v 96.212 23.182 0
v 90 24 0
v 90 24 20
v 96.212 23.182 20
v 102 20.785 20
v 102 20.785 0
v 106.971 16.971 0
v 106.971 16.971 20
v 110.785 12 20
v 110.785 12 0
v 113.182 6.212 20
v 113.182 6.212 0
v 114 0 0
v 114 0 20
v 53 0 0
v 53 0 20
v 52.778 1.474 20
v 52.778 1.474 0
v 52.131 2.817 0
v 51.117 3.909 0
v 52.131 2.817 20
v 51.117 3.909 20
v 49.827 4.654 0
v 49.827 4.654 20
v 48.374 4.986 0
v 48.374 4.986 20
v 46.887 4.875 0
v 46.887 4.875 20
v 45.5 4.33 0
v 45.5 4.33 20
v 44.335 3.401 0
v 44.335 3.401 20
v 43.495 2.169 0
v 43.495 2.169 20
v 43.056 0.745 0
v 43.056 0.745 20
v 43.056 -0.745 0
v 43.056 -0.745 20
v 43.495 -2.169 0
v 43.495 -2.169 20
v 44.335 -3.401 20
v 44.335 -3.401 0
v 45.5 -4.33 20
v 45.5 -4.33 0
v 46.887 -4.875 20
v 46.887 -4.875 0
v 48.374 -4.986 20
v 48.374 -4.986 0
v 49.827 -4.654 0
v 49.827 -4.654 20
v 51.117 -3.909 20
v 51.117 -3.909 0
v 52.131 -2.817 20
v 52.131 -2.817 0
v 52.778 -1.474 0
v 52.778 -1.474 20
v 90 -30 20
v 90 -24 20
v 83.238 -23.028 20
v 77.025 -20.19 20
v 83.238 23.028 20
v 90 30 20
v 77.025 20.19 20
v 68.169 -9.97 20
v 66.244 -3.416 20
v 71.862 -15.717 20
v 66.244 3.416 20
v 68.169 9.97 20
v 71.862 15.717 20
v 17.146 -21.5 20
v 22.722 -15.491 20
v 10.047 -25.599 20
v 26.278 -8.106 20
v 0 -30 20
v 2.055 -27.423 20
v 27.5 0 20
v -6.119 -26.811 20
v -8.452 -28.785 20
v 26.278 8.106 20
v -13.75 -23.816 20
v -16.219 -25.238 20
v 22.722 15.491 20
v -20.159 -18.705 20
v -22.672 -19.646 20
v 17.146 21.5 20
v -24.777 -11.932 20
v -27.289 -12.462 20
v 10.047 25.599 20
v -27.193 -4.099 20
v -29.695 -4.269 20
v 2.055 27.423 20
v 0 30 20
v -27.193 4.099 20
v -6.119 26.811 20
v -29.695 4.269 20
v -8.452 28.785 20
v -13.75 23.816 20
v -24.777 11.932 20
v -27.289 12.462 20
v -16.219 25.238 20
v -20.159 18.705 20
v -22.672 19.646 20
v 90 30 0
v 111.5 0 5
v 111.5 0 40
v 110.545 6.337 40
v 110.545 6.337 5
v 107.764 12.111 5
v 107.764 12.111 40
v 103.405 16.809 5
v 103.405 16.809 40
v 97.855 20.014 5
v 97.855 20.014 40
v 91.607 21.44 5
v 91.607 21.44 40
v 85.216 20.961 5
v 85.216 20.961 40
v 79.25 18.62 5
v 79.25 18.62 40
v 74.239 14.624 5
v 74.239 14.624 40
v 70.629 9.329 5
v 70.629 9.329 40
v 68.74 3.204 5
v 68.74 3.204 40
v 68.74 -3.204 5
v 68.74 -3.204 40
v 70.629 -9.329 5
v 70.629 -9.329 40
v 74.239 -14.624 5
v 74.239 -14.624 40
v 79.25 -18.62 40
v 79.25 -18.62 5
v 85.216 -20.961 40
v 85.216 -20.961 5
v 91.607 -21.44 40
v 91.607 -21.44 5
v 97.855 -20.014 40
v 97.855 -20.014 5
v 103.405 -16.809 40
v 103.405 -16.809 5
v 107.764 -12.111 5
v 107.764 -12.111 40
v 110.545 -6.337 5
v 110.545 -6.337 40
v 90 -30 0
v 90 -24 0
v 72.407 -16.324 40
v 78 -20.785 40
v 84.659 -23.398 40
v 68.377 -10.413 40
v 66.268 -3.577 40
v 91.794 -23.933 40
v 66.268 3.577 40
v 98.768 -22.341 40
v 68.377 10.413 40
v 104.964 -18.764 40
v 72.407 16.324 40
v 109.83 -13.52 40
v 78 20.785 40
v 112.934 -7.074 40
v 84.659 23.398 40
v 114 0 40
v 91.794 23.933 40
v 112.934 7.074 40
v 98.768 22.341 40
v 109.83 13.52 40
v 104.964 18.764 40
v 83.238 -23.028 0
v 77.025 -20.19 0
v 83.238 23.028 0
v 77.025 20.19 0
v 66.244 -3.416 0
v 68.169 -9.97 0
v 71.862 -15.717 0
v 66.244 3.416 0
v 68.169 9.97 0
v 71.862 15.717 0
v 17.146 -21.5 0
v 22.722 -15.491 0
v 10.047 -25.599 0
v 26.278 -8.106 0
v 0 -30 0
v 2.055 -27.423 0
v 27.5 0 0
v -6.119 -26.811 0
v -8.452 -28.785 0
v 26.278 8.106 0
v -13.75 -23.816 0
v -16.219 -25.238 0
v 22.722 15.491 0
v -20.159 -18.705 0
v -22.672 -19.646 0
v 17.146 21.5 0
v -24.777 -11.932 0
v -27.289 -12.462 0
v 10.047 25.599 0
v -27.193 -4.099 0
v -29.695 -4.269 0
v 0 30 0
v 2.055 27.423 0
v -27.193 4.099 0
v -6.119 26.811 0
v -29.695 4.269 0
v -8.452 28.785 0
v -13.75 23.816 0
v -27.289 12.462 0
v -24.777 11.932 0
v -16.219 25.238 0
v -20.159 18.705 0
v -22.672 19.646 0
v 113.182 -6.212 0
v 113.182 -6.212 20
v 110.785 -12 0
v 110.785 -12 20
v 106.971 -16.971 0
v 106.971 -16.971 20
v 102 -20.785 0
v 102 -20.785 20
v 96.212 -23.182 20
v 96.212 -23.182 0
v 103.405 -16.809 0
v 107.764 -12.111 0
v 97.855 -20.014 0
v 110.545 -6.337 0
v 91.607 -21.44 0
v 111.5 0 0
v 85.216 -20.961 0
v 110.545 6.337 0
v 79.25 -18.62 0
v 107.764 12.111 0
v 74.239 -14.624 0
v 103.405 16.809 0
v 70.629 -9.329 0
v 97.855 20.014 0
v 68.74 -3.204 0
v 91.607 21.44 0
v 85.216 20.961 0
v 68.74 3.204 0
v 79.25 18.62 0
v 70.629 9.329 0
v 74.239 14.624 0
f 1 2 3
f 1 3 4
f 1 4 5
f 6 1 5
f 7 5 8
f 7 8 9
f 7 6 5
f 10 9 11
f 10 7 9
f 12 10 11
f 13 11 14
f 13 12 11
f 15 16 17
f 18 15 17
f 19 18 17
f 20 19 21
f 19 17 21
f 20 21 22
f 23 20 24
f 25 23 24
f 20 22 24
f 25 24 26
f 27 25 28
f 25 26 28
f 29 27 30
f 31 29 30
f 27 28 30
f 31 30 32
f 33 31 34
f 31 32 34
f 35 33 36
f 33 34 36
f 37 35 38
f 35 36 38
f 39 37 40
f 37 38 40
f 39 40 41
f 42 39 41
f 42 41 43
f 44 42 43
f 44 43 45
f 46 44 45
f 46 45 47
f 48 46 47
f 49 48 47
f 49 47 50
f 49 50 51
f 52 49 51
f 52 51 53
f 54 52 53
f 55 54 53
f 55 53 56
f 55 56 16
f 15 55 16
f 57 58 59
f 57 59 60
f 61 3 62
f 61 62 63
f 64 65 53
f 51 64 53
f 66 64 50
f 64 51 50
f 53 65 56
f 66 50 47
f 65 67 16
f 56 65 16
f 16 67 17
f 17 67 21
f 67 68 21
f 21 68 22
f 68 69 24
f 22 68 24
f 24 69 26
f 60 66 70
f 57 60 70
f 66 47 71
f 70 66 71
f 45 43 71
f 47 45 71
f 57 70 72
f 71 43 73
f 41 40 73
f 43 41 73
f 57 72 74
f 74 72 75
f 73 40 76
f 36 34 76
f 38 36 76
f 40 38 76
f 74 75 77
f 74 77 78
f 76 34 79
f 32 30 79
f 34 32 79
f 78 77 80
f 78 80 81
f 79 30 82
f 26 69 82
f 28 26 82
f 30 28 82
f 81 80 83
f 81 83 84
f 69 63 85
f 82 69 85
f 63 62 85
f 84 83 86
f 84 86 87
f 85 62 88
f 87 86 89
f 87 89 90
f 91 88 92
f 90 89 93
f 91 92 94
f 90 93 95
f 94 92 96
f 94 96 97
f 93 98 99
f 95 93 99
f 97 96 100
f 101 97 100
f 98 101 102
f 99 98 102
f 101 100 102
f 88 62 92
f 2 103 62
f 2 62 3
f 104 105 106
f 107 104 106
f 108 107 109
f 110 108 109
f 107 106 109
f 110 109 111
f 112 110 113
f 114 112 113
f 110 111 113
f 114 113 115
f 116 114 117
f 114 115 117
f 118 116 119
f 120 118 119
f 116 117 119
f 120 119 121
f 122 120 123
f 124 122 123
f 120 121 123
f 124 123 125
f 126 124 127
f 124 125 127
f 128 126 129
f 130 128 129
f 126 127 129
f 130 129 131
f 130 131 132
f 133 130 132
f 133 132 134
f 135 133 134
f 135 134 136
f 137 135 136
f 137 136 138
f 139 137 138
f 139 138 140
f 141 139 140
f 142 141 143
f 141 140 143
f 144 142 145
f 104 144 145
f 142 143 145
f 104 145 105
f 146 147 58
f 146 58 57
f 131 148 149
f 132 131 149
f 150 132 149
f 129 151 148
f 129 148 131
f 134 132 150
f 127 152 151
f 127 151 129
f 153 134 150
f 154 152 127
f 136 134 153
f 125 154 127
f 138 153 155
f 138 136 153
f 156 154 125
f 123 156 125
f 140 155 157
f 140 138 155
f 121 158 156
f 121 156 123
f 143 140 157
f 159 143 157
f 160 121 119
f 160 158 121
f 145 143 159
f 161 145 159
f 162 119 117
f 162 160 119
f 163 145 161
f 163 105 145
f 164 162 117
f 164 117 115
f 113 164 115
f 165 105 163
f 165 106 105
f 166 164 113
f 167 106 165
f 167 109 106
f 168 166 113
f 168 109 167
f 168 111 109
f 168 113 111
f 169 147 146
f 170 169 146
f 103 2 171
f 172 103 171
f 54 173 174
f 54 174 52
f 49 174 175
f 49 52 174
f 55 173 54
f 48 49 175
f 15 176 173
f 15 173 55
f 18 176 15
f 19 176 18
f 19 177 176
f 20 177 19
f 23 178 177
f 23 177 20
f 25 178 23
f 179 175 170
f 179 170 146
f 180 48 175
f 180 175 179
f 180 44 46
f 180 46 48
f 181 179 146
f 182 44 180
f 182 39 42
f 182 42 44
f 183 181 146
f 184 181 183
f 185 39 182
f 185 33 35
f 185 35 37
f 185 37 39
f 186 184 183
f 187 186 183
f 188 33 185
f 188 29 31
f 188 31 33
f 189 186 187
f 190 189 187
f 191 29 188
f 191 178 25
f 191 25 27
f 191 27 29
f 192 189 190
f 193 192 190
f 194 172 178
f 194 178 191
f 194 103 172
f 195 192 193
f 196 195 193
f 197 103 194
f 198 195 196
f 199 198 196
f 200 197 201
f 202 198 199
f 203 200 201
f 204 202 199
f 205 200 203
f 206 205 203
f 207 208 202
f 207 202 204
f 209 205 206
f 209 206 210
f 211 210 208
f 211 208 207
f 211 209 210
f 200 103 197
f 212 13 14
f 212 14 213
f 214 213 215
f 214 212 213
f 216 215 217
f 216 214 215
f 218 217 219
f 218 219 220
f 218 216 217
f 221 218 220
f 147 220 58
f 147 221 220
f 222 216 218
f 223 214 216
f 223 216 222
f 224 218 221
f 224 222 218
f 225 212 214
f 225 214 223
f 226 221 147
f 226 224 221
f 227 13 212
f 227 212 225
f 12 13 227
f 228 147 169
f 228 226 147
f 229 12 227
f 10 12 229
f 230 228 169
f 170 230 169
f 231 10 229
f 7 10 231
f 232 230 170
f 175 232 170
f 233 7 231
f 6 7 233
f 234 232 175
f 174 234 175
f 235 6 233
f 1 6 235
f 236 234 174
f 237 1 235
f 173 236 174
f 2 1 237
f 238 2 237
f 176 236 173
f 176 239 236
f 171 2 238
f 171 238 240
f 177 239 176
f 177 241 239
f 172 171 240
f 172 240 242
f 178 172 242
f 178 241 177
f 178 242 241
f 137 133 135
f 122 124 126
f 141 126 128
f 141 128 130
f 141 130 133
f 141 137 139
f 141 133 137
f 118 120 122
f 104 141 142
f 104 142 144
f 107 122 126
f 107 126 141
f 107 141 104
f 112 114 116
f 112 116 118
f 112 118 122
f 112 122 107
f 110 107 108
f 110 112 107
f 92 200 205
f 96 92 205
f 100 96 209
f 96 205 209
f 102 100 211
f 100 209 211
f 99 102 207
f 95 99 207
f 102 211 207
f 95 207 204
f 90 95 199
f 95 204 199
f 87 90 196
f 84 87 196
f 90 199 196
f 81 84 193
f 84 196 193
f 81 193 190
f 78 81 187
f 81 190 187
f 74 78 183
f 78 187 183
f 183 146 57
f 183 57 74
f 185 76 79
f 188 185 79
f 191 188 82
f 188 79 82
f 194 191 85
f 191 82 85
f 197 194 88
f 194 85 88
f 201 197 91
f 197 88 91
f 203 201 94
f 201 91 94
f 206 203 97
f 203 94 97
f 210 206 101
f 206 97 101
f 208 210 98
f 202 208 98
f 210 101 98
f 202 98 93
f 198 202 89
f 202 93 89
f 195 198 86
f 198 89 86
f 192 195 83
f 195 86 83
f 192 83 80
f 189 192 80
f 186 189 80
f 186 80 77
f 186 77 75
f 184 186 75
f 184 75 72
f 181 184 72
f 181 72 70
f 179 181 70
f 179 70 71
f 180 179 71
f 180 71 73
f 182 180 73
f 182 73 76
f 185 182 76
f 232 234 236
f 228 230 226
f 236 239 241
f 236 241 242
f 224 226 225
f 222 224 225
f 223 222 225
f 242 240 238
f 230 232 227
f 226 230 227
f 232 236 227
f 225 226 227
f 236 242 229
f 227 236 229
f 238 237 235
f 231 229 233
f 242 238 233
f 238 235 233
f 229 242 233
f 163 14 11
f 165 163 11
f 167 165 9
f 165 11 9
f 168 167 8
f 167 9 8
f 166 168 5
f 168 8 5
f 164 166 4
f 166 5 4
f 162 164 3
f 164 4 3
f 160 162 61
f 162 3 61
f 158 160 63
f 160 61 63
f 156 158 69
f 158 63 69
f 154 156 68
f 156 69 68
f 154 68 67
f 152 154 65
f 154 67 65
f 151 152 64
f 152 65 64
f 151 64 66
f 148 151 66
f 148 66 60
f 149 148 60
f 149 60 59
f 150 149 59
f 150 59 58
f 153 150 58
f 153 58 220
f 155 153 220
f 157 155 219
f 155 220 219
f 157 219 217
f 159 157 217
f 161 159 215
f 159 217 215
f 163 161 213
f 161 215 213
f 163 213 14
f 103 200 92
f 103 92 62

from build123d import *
from build123d.topology import SkipClean

# Parameters (mm, degrees)
SKETCH1_R           = 30
BOSS_EXTRUDE1_DEPTH = 20
SKETCH2_R           = 27.5
CUT_EXTRUDE1_DEPTH  = 47.904157598
BOSS_EXTRUDE2_START = -20
BOSS_EXTRUDE2_DEPTH = 20
SKETCH6_R           = 21.5
CUT_EXTRUDE2_DEPTH  = 35
SKETCH10_R          = 5
CUT_EXTRUDE5_DEPTH  = 120.565881421
SKETCH11_R          = 24
BOSS_EXTRUDE3_DEPTH = 20
BOSS_EXTRUDE4_START = -40
SKETCH12_R          = 24
BOSS_EXTRUDE4_DEPTH = 40
SKETCH13_R          = 21.5
CUT_EXTRUDE6_DEPTH  = 35


with BuildPart() as part:
    # Sketch1 → Boss-Extrude1 (new body)
    with BuildSketch(Plane.XY):
        Circle(SKETCH1_R)
    extrude(amount=BOSS_EXTRUDE1_DEPTH)

    # Sketch2 → Cut-Extrude1 (cut, through all)
    with BuildSketch(Plane.XY.offset(20)):
        Circle(SKETCH2_R)
    extrude(amount=-CUT_EXTRUDE1_DEPTH, mode=Mode.SUBTRACT)

    # Sketch4 → Boss-Extrude2 (add)
    with BuildSketch(Plane.XY.offset(20).offset(BOSS_EXTRUDE2_START)):
        with BuildLine():
            Line((0, 30), (90, 30))
            Line((90, 30), (90, 24))
            ThreePointArc((90, 24), (114, 0), (90, -24))
            Line((90, -24), (90, -30))
            Line((90, -30), (0, -30))
            ThreePointArc((0, -30), (30, 0), (0, 30))
        make_face()
    extrude(amount=BOSS_EXTRUDE2_DEPTH)

    # Sketch6 → Cut-Extrude2 (cut)
    with BuildSketch(Plane.XY.offset(20)):
        with Locations((90, 0)):
            Circle(SKETCH6_R)
    extrude(amount=-CUT_EXTRUDE2_DEPTH, mode=Mode.SUBTRACT)

    # Sketch10 → Cut-Extrude5 (cut, through all)
    with BuildSketch(Plane.XY.offset(20)):
        with Locations((48, 0)):
            Circle(SKETCH10_R)
    extrude(amount=-CUT_EXTRUDE5_DEPTH, mode=Mode.SUBTRACT)

    # Sketch11 → Boss-Extrude3 (add)
    with BuildSketch(Plane.XY.offset(20)):
        with Locations((90, 0)):
            Circle(SKETCH11_R)
    extrude(amount=BOSS_EXTRUDE3_DEPTH)

    # Sketch12 → Boss-Extrude4 (add)
    with SkipClean():  # the faces are left unmerged after this step: merging them gives an invalid solid
        with BuildSketch(Plane.XY.offset(40).offset(BOSS_EXTRUDE4_START)):
            with Locations((90, 0)):
                Circle(SKETCH12_R)
        extrude(amount=BOSS_EXTRUDE4_DEPTH)

    # Sketch13 → Cut-Extrude6 (cut)
    with SkipClean():  # the faces are left unmerged after this step: merging them gives an invalid solid
        with BuildSketch(Plane.XY.offset(40)):
            with Locations((90, 0)):
                Circle(SKETCH13_R)
        extrude(amount=-CUT_EXTRUDE6_DEPTH, mode=Mode.SUBTRACT)


solid = part.part
